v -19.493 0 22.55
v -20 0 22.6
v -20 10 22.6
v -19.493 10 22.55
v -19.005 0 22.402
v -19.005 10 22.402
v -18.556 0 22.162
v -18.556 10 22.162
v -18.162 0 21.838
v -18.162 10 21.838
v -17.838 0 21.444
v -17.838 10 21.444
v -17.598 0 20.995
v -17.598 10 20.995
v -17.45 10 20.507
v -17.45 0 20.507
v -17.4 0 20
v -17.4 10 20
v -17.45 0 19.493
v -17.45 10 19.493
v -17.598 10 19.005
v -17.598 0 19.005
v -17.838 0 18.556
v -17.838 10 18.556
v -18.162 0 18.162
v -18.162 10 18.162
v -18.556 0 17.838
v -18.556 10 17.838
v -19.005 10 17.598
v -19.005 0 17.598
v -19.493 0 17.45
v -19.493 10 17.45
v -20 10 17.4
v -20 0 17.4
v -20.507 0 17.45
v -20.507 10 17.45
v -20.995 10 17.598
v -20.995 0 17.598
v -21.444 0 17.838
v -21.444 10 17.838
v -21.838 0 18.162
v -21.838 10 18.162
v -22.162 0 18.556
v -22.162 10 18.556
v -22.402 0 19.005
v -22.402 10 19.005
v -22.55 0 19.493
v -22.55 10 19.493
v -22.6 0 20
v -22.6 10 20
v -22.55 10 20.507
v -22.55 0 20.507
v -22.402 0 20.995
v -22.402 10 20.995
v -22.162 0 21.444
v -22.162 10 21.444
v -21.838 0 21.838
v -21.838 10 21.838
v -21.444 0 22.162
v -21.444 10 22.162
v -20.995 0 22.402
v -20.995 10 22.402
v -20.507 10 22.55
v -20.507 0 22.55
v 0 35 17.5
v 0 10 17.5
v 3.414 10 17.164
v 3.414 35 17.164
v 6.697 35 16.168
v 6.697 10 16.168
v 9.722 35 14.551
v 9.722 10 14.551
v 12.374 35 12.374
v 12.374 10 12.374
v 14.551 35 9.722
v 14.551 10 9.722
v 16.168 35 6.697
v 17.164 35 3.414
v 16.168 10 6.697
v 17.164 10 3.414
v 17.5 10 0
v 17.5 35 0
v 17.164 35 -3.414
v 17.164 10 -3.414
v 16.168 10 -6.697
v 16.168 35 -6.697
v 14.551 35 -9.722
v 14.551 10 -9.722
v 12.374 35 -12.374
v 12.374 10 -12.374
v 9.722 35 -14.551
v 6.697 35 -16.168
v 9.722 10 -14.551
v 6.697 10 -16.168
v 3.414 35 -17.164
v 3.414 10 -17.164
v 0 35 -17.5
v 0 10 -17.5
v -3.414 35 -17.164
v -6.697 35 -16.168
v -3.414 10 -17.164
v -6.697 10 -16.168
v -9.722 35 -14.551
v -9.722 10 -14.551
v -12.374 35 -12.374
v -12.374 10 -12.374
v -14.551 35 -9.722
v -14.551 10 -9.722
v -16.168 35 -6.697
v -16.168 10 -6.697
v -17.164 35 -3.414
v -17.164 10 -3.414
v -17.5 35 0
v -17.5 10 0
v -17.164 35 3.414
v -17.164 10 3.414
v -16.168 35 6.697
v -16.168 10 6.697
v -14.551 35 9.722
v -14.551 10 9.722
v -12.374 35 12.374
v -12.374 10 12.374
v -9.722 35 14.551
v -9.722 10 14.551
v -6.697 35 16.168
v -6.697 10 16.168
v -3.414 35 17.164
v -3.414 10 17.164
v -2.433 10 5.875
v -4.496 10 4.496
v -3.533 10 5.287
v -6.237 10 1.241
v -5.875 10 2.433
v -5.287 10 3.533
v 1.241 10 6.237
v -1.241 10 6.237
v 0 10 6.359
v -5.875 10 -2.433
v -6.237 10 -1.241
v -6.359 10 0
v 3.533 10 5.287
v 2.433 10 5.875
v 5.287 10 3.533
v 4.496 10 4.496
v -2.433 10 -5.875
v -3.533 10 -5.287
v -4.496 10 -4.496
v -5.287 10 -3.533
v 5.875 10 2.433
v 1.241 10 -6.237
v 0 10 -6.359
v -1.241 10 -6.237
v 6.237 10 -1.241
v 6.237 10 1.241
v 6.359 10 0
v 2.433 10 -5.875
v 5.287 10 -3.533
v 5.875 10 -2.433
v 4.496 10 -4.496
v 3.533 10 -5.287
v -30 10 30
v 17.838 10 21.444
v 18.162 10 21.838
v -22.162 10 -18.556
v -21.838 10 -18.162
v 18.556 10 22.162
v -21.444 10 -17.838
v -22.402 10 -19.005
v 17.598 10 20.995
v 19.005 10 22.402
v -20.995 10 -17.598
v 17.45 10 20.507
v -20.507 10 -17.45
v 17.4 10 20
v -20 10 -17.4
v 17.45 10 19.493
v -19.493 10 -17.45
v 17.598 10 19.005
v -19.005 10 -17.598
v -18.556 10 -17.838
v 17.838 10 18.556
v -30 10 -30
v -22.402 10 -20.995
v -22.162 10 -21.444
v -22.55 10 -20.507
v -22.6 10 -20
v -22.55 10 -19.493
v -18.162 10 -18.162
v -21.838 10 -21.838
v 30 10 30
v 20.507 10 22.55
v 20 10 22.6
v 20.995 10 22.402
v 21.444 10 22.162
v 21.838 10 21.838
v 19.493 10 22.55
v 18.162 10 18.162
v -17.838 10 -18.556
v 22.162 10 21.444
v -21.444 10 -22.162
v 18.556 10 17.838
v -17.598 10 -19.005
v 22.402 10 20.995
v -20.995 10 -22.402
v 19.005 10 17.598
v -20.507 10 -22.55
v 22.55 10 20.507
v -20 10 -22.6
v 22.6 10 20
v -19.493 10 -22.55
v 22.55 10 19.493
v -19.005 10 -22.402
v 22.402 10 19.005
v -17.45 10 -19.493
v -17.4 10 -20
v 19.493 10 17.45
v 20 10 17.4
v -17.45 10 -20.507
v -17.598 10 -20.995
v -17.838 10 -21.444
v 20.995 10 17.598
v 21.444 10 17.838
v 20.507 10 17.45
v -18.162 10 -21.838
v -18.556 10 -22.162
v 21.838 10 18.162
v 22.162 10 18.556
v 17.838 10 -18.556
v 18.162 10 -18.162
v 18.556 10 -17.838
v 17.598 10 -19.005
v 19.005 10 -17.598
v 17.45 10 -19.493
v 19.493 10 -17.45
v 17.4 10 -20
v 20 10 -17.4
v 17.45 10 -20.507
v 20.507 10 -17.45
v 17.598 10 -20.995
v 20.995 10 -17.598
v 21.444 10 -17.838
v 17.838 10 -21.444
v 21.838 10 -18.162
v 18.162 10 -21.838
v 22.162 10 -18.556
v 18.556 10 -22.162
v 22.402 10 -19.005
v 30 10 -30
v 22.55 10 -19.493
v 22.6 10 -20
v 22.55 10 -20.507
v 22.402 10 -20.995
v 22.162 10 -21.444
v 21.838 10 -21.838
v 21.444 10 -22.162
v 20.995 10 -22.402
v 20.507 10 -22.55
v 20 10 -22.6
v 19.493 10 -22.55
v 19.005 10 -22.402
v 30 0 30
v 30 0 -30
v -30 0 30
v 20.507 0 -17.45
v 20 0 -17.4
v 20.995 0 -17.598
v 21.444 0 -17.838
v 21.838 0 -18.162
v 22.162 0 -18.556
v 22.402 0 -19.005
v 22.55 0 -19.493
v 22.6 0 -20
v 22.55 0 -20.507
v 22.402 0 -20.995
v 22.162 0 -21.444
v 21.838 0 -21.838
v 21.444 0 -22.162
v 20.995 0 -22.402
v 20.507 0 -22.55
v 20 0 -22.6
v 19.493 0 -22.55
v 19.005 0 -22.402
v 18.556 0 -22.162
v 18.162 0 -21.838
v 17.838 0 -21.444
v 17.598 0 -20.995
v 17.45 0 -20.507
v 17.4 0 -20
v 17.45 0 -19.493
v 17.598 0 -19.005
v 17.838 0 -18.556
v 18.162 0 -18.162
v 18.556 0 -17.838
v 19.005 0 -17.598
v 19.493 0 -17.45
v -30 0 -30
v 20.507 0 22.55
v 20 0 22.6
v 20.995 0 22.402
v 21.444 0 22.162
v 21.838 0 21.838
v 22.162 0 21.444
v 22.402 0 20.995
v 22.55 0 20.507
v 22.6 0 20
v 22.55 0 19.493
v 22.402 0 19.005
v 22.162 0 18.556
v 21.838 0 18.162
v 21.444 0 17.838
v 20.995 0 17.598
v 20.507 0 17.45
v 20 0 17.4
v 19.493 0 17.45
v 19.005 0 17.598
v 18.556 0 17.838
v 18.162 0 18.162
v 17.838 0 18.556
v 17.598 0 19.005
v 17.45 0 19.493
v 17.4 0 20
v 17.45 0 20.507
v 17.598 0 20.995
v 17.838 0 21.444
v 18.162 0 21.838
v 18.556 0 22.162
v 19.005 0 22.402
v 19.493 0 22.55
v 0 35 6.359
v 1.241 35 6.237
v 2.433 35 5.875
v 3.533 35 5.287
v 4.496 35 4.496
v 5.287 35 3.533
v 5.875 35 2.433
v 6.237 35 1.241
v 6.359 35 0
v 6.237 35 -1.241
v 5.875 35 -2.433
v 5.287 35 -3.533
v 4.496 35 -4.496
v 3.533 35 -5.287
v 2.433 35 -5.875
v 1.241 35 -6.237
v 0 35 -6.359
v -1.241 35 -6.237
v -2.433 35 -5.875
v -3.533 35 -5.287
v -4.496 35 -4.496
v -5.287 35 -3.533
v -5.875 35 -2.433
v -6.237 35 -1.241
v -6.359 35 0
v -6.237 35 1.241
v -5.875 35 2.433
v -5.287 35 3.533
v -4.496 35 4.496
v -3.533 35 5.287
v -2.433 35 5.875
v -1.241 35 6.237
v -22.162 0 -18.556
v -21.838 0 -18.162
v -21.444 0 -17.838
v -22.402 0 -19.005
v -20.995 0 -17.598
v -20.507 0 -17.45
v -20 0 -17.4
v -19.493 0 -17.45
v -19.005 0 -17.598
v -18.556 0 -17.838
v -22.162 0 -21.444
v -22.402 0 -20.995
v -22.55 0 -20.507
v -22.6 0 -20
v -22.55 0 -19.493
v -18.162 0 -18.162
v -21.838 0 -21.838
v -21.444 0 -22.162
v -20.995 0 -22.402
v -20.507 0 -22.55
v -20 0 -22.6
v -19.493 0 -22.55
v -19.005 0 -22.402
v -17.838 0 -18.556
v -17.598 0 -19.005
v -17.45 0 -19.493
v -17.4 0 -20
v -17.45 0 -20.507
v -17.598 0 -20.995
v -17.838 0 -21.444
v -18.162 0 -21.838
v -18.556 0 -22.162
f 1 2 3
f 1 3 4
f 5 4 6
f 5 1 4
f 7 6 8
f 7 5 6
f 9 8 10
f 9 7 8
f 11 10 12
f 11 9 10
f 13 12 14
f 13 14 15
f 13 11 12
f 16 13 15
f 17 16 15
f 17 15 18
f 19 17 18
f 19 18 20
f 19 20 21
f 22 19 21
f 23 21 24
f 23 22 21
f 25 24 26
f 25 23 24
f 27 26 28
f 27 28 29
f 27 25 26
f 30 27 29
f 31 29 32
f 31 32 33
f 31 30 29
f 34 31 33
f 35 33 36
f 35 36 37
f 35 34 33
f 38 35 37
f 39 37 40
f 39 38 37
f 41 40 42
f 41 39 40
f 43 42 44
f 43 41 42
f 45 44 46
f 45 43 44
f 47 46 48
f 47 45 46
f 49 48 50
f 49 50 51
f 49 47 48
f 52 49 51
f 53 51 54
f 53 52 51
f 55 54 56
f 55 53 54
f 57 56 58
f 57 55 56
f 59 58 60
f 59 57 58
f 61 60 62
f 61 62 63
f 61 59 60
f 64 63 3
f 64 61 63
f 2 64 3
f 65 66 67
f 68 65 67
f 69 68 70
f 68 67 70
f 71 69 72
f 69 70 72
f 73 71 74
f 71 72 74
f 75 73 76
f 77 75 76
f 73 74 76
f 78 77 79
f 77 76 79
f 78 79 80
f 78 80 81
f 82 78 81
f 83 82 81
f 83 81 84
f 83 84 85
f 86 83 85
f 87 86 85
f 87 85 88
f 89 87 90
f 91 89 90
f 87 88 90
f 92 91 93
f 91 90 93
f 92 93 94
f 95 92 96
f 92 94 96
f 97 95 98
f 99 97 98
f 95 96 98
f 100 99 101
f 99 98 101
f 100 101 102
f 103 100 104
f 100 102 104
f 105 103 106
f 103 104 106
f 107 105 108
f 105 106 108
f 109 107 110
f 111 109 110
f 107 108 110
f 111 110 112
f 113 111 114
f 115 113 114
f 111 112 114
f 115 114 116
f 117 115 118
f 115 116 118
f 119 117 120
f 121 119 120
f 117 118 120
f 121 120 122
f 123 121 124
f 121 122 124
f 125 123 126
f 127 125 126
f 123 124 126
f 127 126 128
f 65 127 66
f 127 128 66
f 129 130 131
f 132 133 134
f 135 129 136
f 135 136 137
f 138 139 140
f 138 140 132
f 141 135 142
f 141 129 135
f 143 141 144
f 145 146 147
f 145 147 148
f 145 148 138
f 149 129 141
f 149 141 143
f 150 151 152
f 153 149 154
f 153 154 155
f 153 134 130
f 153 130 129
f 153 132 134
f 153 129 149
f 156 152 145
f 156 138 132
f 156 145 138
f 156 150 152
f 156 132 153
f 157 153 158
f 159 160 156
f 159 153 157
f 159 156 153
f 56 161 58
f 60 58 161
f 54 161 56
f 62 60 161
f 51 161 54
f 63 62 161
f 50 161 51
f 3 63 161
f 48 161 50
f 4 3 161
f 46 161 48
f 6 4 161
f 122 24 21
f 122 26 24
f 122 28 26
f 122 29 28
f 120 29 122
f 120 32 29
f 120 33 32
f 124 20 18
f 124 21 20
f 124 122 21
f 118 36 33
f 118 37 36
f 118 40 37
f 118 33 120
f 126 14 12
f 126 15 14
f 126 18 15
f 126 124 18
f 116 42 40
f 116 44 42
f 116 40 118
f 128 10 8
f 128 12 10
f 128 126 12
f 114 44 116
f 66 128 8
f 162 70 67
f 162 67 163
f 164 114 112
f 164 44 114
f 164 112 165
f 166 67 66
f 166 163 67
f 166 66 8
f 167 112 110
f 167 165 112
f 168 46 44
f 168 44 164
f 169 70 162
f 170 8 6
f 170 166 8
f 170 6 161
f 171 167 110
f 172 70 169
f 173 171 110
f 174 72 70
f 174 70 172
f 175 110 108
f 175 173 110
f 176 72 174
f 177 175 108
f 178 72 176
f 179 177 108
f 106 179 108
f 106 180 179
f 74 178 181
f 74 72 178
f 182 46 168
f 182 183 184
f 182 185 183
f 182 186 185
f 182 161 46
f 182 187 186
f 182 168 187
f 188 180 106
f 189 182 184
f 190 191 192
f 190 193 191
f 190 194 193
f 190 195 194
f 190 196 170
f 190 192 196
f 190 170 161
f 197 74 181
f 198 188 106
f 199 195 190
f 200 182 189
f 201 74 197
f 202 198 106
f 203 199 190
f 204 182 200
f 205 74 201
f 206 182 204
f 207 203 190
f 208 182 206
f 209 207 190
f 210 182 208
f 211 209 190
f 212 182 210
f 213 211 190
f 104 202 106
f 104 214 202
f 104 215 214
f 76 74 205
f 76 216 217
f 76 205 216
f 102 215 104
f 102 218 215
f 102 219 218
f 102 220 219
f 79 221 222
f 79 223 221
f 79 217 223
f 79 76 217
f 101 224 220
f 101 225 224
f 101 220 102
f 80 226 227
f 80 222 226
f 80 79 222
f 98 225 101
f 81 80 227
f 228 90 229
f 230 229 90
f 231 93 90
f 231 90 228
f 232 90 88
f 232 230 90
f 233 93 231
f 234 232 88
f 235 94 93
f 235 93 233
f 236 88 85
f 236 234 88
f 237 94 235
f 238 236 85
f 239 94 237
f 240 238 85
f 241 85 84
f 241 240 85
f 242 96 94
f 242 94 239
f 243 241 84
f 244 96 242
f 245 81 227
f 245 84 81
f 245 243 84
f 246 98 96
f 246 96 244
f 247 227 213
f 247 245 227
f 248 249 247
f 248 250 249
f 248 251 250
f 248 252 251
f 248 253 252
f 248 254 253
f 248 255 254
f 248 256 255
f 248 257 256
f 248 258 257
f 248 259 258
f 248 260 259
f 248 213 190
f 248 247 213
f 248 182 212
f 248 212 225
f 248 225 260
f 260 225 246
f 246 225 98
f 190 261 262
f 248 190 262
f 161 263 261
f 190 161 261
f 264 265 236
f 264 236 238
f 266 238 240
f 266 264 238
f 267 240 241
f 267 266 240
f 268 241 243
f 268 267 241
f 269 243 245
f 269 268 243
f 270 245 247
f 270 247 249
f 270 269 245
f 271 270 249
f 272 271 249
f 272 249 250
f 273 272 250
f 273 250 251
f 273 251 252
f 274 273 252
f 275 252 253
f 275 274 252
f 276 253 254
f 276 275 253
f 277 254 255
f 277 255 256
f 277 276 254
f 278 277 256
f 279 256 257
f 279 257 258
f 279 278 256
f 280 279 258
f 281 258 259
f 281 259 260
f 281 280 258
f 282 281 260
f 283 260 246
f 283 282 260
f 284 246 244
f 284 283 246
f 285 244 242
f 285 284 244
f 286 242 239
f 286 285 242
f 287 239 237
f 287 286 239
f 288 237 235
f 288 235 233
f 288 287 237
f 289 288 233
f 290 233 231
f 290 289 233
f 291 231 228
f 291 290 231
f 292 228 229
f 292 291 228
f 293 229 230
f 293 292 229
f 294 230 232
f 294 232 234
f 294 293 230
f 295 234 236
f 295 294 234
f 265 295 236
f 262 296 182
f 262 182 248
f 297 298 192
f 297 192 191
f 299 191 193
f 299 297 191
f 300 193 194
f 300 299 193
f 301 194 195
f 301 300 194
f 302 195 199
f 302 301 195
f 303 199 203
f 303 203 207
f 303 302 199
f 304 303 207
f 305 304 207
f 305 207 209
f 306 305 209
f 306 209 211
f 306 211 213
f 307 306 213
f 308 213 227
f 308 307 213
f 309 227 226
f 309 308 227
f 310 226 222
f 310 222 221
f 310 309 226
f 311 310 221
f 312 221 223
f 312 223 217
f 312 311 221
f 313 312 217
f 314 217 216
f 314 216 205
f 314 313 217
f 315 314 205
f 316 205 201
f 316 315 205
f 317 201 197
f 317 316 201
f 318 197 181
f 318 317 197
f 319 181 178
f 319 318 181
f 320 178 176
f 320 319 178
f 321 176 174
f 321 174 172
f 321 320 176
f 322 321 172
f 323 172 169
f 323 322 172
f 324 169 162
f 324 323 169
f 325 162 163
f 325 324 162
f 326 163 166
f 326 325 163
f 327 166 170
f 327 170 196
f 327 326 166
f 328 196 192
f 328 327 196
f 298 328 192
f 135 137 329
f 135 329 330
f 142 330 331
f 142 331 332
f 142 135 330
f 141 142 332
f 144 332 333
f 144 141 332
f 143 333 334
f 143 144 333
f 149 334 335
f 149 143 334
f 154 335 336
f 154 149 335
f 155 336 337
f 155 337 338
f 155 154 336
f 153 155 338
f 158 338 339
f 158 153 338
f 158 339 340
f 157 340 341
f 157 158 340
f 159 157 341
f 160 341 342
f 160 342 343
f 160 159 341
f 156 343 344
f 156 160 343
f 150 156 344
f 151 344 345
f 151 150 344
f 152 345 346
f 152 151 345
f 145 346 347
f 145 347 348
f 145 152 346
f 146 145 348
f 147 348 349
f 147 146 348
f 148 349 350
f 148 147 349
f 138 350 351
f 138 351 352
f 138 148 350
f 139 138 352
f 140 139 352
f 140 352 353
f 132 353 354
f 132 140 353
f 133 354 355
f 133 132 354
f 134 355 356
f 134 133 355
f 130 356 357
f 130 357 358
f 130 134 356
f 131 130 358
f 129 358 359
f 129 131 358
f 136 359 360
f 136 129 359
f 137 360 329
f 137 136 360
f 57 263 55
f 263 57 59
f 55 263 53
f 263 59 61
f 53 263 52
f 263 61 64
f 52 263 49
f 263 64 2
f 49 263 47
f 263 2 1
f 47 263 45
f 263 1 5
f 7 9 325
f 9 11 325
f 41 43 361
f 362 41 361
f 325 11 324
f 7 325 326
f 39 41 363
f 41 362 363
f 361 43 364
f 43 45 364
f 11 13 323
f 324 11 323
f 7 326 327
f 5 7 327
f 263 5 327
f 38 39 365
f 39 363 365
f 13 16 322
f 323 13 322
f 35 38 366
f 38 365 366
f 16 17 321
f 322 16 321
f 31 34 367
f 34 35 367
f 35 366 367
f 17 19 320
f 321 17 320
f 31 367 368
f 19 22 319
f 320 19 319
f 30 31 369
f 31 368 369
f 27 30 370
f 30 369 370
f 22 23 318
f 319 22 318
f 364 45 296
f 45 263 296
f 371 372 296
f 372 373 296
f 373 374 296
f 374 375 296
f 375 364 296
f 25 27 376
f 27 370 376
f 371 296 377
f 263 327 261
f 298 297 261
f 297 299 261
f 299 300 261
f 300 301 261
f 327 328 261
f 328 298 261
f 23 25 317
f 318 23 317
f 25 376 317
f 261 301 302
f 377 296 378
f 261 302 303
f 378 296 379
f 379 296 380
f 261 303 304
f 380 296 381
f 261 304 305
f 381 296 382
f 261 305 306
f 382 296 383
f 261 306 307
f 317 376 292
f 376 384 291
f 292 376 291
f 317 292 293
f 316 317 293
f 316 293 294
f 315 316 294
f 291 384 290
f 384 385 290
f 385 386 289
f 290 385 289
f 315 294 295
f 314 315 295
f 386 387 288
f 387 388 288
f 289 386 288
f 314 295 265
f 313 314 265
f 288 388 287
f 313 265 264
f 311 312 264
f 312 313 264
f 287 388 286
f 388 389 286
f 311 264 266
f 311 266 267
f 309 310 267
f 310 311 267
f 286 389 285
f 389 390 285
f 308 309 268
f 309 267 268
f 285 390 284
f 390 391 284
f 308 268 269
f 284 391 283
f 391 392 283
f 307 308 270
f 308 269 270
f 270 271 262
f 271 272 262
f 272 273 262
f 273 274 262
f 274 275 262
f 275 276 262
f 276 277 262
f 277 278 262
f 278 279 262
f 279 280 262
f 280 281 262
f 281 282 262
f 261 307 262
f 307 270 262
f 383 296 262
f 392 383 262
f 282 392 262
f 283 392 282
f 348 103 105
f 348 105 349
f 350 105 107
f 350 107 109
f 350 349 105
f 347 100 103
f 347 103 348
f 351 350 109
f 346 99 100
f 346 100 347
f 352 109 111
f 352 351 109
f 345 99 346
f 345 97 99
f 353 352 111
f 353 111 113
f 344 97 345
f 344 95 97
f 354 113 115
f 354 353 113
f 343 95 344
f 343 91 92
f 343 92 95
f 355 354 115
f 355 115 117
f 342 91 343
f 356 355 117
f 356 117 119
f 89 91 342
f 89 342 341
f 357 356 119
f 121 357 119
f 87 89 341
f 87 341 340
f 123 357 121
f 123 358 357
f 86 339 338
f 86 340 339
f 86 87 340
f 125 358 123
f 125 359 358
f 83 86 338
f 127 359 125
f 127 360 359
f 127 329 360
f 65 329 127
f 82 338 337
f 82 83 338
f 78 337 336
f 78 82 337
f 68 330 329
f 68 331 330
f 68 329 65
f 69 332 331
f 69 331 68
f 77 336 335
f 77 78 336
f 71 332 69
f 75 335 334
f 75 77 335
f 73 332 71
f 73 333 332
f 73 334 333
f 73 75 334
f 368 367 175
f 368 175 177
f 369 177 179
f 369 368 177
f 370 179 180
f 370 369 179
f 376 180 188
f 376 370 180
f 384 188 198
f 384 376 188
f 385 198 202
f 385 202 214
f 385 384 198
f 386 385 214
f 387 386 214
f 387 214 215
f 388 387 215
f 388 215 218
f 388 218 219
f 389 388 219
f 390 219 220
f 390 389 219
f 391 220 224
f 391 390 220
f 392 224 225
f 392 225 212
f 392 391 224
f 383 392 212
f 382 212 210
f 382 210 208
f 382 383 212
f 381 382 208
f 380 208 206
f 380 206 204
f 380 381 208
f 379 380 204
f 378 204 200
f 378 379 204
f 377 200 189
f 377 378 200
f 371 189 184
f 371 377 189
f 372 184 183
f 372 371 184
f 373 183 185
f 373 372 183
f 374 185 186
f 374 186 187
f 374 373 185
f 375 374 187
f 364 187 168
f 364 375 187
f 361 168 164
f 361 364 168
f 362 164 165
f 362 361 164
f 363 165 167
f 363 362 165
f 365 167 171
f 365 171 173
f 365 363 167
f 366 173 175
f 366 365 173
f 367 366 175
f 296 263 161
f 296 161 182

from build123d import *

# Parameters (mm, degrees)
SKETCH1_W           = 60
SKETCH1_H           = 60
SKETCH1_R           = 2.6
BOSS_EXTRUDE1_DEPTH = 10
SKETCH2_R           = 17.5
SKETCH2_R_2         = 6.35889
BOSS_EXTRUDE2_DEPTH = 25


with BuildPart() as part:
    # Sketch1 → Boss-Extrude1 (new body)
    with BuildSketch(Plane(origin=(0, 0, 0), x_dir=(1, 0, 0), z_dir=(0, 1, 0))):
        Rectangle(SKETCH1_W, SKETCH1_H)
        with Locations(Location((-20, 20, 0), (0, 0, 270))):
            Circle(SKETCH1_R, mode=Mode.SUBTRACT)
        with Locations(Location((20, 20, 0), (0, 0, 270))):
            Circle(SKETCH1_R, mode=Mode.SUBTRACT)
        with Locations(Location((-20, -20, 0), (0, 0, 270))):
            Circle(SKETCH1_R, mode=Mode.SUBTRACT)
        with Locations(Location((20, -20, 0), (0, 0, 270))):
            Circle(SKETCH1_R, mode=Mode.SUBTRACT)
    extrude(amount=BOSS_EXTRUDE1_DEPTH)

    # Sketch2 → Boss-Extrude2 (add)
    with BuildSketch(Plane(origin=(0, 10, 0), x_dir=(1, 0, 0), z_dir=(0, 1, 0))):
        with Locations(Location((0, 0, 0), (0, 0, 270))):
            Circle(SKETCH2_R)
        with Locations(Location((0, 0, 0), (0, 0, 270))):
            Circle(SKETCH2_R_2, mode=Mode.SUBTRACT)
    extrude(amount=BOSS_EXTRUDE2_DEPTH)


solid = part.part
